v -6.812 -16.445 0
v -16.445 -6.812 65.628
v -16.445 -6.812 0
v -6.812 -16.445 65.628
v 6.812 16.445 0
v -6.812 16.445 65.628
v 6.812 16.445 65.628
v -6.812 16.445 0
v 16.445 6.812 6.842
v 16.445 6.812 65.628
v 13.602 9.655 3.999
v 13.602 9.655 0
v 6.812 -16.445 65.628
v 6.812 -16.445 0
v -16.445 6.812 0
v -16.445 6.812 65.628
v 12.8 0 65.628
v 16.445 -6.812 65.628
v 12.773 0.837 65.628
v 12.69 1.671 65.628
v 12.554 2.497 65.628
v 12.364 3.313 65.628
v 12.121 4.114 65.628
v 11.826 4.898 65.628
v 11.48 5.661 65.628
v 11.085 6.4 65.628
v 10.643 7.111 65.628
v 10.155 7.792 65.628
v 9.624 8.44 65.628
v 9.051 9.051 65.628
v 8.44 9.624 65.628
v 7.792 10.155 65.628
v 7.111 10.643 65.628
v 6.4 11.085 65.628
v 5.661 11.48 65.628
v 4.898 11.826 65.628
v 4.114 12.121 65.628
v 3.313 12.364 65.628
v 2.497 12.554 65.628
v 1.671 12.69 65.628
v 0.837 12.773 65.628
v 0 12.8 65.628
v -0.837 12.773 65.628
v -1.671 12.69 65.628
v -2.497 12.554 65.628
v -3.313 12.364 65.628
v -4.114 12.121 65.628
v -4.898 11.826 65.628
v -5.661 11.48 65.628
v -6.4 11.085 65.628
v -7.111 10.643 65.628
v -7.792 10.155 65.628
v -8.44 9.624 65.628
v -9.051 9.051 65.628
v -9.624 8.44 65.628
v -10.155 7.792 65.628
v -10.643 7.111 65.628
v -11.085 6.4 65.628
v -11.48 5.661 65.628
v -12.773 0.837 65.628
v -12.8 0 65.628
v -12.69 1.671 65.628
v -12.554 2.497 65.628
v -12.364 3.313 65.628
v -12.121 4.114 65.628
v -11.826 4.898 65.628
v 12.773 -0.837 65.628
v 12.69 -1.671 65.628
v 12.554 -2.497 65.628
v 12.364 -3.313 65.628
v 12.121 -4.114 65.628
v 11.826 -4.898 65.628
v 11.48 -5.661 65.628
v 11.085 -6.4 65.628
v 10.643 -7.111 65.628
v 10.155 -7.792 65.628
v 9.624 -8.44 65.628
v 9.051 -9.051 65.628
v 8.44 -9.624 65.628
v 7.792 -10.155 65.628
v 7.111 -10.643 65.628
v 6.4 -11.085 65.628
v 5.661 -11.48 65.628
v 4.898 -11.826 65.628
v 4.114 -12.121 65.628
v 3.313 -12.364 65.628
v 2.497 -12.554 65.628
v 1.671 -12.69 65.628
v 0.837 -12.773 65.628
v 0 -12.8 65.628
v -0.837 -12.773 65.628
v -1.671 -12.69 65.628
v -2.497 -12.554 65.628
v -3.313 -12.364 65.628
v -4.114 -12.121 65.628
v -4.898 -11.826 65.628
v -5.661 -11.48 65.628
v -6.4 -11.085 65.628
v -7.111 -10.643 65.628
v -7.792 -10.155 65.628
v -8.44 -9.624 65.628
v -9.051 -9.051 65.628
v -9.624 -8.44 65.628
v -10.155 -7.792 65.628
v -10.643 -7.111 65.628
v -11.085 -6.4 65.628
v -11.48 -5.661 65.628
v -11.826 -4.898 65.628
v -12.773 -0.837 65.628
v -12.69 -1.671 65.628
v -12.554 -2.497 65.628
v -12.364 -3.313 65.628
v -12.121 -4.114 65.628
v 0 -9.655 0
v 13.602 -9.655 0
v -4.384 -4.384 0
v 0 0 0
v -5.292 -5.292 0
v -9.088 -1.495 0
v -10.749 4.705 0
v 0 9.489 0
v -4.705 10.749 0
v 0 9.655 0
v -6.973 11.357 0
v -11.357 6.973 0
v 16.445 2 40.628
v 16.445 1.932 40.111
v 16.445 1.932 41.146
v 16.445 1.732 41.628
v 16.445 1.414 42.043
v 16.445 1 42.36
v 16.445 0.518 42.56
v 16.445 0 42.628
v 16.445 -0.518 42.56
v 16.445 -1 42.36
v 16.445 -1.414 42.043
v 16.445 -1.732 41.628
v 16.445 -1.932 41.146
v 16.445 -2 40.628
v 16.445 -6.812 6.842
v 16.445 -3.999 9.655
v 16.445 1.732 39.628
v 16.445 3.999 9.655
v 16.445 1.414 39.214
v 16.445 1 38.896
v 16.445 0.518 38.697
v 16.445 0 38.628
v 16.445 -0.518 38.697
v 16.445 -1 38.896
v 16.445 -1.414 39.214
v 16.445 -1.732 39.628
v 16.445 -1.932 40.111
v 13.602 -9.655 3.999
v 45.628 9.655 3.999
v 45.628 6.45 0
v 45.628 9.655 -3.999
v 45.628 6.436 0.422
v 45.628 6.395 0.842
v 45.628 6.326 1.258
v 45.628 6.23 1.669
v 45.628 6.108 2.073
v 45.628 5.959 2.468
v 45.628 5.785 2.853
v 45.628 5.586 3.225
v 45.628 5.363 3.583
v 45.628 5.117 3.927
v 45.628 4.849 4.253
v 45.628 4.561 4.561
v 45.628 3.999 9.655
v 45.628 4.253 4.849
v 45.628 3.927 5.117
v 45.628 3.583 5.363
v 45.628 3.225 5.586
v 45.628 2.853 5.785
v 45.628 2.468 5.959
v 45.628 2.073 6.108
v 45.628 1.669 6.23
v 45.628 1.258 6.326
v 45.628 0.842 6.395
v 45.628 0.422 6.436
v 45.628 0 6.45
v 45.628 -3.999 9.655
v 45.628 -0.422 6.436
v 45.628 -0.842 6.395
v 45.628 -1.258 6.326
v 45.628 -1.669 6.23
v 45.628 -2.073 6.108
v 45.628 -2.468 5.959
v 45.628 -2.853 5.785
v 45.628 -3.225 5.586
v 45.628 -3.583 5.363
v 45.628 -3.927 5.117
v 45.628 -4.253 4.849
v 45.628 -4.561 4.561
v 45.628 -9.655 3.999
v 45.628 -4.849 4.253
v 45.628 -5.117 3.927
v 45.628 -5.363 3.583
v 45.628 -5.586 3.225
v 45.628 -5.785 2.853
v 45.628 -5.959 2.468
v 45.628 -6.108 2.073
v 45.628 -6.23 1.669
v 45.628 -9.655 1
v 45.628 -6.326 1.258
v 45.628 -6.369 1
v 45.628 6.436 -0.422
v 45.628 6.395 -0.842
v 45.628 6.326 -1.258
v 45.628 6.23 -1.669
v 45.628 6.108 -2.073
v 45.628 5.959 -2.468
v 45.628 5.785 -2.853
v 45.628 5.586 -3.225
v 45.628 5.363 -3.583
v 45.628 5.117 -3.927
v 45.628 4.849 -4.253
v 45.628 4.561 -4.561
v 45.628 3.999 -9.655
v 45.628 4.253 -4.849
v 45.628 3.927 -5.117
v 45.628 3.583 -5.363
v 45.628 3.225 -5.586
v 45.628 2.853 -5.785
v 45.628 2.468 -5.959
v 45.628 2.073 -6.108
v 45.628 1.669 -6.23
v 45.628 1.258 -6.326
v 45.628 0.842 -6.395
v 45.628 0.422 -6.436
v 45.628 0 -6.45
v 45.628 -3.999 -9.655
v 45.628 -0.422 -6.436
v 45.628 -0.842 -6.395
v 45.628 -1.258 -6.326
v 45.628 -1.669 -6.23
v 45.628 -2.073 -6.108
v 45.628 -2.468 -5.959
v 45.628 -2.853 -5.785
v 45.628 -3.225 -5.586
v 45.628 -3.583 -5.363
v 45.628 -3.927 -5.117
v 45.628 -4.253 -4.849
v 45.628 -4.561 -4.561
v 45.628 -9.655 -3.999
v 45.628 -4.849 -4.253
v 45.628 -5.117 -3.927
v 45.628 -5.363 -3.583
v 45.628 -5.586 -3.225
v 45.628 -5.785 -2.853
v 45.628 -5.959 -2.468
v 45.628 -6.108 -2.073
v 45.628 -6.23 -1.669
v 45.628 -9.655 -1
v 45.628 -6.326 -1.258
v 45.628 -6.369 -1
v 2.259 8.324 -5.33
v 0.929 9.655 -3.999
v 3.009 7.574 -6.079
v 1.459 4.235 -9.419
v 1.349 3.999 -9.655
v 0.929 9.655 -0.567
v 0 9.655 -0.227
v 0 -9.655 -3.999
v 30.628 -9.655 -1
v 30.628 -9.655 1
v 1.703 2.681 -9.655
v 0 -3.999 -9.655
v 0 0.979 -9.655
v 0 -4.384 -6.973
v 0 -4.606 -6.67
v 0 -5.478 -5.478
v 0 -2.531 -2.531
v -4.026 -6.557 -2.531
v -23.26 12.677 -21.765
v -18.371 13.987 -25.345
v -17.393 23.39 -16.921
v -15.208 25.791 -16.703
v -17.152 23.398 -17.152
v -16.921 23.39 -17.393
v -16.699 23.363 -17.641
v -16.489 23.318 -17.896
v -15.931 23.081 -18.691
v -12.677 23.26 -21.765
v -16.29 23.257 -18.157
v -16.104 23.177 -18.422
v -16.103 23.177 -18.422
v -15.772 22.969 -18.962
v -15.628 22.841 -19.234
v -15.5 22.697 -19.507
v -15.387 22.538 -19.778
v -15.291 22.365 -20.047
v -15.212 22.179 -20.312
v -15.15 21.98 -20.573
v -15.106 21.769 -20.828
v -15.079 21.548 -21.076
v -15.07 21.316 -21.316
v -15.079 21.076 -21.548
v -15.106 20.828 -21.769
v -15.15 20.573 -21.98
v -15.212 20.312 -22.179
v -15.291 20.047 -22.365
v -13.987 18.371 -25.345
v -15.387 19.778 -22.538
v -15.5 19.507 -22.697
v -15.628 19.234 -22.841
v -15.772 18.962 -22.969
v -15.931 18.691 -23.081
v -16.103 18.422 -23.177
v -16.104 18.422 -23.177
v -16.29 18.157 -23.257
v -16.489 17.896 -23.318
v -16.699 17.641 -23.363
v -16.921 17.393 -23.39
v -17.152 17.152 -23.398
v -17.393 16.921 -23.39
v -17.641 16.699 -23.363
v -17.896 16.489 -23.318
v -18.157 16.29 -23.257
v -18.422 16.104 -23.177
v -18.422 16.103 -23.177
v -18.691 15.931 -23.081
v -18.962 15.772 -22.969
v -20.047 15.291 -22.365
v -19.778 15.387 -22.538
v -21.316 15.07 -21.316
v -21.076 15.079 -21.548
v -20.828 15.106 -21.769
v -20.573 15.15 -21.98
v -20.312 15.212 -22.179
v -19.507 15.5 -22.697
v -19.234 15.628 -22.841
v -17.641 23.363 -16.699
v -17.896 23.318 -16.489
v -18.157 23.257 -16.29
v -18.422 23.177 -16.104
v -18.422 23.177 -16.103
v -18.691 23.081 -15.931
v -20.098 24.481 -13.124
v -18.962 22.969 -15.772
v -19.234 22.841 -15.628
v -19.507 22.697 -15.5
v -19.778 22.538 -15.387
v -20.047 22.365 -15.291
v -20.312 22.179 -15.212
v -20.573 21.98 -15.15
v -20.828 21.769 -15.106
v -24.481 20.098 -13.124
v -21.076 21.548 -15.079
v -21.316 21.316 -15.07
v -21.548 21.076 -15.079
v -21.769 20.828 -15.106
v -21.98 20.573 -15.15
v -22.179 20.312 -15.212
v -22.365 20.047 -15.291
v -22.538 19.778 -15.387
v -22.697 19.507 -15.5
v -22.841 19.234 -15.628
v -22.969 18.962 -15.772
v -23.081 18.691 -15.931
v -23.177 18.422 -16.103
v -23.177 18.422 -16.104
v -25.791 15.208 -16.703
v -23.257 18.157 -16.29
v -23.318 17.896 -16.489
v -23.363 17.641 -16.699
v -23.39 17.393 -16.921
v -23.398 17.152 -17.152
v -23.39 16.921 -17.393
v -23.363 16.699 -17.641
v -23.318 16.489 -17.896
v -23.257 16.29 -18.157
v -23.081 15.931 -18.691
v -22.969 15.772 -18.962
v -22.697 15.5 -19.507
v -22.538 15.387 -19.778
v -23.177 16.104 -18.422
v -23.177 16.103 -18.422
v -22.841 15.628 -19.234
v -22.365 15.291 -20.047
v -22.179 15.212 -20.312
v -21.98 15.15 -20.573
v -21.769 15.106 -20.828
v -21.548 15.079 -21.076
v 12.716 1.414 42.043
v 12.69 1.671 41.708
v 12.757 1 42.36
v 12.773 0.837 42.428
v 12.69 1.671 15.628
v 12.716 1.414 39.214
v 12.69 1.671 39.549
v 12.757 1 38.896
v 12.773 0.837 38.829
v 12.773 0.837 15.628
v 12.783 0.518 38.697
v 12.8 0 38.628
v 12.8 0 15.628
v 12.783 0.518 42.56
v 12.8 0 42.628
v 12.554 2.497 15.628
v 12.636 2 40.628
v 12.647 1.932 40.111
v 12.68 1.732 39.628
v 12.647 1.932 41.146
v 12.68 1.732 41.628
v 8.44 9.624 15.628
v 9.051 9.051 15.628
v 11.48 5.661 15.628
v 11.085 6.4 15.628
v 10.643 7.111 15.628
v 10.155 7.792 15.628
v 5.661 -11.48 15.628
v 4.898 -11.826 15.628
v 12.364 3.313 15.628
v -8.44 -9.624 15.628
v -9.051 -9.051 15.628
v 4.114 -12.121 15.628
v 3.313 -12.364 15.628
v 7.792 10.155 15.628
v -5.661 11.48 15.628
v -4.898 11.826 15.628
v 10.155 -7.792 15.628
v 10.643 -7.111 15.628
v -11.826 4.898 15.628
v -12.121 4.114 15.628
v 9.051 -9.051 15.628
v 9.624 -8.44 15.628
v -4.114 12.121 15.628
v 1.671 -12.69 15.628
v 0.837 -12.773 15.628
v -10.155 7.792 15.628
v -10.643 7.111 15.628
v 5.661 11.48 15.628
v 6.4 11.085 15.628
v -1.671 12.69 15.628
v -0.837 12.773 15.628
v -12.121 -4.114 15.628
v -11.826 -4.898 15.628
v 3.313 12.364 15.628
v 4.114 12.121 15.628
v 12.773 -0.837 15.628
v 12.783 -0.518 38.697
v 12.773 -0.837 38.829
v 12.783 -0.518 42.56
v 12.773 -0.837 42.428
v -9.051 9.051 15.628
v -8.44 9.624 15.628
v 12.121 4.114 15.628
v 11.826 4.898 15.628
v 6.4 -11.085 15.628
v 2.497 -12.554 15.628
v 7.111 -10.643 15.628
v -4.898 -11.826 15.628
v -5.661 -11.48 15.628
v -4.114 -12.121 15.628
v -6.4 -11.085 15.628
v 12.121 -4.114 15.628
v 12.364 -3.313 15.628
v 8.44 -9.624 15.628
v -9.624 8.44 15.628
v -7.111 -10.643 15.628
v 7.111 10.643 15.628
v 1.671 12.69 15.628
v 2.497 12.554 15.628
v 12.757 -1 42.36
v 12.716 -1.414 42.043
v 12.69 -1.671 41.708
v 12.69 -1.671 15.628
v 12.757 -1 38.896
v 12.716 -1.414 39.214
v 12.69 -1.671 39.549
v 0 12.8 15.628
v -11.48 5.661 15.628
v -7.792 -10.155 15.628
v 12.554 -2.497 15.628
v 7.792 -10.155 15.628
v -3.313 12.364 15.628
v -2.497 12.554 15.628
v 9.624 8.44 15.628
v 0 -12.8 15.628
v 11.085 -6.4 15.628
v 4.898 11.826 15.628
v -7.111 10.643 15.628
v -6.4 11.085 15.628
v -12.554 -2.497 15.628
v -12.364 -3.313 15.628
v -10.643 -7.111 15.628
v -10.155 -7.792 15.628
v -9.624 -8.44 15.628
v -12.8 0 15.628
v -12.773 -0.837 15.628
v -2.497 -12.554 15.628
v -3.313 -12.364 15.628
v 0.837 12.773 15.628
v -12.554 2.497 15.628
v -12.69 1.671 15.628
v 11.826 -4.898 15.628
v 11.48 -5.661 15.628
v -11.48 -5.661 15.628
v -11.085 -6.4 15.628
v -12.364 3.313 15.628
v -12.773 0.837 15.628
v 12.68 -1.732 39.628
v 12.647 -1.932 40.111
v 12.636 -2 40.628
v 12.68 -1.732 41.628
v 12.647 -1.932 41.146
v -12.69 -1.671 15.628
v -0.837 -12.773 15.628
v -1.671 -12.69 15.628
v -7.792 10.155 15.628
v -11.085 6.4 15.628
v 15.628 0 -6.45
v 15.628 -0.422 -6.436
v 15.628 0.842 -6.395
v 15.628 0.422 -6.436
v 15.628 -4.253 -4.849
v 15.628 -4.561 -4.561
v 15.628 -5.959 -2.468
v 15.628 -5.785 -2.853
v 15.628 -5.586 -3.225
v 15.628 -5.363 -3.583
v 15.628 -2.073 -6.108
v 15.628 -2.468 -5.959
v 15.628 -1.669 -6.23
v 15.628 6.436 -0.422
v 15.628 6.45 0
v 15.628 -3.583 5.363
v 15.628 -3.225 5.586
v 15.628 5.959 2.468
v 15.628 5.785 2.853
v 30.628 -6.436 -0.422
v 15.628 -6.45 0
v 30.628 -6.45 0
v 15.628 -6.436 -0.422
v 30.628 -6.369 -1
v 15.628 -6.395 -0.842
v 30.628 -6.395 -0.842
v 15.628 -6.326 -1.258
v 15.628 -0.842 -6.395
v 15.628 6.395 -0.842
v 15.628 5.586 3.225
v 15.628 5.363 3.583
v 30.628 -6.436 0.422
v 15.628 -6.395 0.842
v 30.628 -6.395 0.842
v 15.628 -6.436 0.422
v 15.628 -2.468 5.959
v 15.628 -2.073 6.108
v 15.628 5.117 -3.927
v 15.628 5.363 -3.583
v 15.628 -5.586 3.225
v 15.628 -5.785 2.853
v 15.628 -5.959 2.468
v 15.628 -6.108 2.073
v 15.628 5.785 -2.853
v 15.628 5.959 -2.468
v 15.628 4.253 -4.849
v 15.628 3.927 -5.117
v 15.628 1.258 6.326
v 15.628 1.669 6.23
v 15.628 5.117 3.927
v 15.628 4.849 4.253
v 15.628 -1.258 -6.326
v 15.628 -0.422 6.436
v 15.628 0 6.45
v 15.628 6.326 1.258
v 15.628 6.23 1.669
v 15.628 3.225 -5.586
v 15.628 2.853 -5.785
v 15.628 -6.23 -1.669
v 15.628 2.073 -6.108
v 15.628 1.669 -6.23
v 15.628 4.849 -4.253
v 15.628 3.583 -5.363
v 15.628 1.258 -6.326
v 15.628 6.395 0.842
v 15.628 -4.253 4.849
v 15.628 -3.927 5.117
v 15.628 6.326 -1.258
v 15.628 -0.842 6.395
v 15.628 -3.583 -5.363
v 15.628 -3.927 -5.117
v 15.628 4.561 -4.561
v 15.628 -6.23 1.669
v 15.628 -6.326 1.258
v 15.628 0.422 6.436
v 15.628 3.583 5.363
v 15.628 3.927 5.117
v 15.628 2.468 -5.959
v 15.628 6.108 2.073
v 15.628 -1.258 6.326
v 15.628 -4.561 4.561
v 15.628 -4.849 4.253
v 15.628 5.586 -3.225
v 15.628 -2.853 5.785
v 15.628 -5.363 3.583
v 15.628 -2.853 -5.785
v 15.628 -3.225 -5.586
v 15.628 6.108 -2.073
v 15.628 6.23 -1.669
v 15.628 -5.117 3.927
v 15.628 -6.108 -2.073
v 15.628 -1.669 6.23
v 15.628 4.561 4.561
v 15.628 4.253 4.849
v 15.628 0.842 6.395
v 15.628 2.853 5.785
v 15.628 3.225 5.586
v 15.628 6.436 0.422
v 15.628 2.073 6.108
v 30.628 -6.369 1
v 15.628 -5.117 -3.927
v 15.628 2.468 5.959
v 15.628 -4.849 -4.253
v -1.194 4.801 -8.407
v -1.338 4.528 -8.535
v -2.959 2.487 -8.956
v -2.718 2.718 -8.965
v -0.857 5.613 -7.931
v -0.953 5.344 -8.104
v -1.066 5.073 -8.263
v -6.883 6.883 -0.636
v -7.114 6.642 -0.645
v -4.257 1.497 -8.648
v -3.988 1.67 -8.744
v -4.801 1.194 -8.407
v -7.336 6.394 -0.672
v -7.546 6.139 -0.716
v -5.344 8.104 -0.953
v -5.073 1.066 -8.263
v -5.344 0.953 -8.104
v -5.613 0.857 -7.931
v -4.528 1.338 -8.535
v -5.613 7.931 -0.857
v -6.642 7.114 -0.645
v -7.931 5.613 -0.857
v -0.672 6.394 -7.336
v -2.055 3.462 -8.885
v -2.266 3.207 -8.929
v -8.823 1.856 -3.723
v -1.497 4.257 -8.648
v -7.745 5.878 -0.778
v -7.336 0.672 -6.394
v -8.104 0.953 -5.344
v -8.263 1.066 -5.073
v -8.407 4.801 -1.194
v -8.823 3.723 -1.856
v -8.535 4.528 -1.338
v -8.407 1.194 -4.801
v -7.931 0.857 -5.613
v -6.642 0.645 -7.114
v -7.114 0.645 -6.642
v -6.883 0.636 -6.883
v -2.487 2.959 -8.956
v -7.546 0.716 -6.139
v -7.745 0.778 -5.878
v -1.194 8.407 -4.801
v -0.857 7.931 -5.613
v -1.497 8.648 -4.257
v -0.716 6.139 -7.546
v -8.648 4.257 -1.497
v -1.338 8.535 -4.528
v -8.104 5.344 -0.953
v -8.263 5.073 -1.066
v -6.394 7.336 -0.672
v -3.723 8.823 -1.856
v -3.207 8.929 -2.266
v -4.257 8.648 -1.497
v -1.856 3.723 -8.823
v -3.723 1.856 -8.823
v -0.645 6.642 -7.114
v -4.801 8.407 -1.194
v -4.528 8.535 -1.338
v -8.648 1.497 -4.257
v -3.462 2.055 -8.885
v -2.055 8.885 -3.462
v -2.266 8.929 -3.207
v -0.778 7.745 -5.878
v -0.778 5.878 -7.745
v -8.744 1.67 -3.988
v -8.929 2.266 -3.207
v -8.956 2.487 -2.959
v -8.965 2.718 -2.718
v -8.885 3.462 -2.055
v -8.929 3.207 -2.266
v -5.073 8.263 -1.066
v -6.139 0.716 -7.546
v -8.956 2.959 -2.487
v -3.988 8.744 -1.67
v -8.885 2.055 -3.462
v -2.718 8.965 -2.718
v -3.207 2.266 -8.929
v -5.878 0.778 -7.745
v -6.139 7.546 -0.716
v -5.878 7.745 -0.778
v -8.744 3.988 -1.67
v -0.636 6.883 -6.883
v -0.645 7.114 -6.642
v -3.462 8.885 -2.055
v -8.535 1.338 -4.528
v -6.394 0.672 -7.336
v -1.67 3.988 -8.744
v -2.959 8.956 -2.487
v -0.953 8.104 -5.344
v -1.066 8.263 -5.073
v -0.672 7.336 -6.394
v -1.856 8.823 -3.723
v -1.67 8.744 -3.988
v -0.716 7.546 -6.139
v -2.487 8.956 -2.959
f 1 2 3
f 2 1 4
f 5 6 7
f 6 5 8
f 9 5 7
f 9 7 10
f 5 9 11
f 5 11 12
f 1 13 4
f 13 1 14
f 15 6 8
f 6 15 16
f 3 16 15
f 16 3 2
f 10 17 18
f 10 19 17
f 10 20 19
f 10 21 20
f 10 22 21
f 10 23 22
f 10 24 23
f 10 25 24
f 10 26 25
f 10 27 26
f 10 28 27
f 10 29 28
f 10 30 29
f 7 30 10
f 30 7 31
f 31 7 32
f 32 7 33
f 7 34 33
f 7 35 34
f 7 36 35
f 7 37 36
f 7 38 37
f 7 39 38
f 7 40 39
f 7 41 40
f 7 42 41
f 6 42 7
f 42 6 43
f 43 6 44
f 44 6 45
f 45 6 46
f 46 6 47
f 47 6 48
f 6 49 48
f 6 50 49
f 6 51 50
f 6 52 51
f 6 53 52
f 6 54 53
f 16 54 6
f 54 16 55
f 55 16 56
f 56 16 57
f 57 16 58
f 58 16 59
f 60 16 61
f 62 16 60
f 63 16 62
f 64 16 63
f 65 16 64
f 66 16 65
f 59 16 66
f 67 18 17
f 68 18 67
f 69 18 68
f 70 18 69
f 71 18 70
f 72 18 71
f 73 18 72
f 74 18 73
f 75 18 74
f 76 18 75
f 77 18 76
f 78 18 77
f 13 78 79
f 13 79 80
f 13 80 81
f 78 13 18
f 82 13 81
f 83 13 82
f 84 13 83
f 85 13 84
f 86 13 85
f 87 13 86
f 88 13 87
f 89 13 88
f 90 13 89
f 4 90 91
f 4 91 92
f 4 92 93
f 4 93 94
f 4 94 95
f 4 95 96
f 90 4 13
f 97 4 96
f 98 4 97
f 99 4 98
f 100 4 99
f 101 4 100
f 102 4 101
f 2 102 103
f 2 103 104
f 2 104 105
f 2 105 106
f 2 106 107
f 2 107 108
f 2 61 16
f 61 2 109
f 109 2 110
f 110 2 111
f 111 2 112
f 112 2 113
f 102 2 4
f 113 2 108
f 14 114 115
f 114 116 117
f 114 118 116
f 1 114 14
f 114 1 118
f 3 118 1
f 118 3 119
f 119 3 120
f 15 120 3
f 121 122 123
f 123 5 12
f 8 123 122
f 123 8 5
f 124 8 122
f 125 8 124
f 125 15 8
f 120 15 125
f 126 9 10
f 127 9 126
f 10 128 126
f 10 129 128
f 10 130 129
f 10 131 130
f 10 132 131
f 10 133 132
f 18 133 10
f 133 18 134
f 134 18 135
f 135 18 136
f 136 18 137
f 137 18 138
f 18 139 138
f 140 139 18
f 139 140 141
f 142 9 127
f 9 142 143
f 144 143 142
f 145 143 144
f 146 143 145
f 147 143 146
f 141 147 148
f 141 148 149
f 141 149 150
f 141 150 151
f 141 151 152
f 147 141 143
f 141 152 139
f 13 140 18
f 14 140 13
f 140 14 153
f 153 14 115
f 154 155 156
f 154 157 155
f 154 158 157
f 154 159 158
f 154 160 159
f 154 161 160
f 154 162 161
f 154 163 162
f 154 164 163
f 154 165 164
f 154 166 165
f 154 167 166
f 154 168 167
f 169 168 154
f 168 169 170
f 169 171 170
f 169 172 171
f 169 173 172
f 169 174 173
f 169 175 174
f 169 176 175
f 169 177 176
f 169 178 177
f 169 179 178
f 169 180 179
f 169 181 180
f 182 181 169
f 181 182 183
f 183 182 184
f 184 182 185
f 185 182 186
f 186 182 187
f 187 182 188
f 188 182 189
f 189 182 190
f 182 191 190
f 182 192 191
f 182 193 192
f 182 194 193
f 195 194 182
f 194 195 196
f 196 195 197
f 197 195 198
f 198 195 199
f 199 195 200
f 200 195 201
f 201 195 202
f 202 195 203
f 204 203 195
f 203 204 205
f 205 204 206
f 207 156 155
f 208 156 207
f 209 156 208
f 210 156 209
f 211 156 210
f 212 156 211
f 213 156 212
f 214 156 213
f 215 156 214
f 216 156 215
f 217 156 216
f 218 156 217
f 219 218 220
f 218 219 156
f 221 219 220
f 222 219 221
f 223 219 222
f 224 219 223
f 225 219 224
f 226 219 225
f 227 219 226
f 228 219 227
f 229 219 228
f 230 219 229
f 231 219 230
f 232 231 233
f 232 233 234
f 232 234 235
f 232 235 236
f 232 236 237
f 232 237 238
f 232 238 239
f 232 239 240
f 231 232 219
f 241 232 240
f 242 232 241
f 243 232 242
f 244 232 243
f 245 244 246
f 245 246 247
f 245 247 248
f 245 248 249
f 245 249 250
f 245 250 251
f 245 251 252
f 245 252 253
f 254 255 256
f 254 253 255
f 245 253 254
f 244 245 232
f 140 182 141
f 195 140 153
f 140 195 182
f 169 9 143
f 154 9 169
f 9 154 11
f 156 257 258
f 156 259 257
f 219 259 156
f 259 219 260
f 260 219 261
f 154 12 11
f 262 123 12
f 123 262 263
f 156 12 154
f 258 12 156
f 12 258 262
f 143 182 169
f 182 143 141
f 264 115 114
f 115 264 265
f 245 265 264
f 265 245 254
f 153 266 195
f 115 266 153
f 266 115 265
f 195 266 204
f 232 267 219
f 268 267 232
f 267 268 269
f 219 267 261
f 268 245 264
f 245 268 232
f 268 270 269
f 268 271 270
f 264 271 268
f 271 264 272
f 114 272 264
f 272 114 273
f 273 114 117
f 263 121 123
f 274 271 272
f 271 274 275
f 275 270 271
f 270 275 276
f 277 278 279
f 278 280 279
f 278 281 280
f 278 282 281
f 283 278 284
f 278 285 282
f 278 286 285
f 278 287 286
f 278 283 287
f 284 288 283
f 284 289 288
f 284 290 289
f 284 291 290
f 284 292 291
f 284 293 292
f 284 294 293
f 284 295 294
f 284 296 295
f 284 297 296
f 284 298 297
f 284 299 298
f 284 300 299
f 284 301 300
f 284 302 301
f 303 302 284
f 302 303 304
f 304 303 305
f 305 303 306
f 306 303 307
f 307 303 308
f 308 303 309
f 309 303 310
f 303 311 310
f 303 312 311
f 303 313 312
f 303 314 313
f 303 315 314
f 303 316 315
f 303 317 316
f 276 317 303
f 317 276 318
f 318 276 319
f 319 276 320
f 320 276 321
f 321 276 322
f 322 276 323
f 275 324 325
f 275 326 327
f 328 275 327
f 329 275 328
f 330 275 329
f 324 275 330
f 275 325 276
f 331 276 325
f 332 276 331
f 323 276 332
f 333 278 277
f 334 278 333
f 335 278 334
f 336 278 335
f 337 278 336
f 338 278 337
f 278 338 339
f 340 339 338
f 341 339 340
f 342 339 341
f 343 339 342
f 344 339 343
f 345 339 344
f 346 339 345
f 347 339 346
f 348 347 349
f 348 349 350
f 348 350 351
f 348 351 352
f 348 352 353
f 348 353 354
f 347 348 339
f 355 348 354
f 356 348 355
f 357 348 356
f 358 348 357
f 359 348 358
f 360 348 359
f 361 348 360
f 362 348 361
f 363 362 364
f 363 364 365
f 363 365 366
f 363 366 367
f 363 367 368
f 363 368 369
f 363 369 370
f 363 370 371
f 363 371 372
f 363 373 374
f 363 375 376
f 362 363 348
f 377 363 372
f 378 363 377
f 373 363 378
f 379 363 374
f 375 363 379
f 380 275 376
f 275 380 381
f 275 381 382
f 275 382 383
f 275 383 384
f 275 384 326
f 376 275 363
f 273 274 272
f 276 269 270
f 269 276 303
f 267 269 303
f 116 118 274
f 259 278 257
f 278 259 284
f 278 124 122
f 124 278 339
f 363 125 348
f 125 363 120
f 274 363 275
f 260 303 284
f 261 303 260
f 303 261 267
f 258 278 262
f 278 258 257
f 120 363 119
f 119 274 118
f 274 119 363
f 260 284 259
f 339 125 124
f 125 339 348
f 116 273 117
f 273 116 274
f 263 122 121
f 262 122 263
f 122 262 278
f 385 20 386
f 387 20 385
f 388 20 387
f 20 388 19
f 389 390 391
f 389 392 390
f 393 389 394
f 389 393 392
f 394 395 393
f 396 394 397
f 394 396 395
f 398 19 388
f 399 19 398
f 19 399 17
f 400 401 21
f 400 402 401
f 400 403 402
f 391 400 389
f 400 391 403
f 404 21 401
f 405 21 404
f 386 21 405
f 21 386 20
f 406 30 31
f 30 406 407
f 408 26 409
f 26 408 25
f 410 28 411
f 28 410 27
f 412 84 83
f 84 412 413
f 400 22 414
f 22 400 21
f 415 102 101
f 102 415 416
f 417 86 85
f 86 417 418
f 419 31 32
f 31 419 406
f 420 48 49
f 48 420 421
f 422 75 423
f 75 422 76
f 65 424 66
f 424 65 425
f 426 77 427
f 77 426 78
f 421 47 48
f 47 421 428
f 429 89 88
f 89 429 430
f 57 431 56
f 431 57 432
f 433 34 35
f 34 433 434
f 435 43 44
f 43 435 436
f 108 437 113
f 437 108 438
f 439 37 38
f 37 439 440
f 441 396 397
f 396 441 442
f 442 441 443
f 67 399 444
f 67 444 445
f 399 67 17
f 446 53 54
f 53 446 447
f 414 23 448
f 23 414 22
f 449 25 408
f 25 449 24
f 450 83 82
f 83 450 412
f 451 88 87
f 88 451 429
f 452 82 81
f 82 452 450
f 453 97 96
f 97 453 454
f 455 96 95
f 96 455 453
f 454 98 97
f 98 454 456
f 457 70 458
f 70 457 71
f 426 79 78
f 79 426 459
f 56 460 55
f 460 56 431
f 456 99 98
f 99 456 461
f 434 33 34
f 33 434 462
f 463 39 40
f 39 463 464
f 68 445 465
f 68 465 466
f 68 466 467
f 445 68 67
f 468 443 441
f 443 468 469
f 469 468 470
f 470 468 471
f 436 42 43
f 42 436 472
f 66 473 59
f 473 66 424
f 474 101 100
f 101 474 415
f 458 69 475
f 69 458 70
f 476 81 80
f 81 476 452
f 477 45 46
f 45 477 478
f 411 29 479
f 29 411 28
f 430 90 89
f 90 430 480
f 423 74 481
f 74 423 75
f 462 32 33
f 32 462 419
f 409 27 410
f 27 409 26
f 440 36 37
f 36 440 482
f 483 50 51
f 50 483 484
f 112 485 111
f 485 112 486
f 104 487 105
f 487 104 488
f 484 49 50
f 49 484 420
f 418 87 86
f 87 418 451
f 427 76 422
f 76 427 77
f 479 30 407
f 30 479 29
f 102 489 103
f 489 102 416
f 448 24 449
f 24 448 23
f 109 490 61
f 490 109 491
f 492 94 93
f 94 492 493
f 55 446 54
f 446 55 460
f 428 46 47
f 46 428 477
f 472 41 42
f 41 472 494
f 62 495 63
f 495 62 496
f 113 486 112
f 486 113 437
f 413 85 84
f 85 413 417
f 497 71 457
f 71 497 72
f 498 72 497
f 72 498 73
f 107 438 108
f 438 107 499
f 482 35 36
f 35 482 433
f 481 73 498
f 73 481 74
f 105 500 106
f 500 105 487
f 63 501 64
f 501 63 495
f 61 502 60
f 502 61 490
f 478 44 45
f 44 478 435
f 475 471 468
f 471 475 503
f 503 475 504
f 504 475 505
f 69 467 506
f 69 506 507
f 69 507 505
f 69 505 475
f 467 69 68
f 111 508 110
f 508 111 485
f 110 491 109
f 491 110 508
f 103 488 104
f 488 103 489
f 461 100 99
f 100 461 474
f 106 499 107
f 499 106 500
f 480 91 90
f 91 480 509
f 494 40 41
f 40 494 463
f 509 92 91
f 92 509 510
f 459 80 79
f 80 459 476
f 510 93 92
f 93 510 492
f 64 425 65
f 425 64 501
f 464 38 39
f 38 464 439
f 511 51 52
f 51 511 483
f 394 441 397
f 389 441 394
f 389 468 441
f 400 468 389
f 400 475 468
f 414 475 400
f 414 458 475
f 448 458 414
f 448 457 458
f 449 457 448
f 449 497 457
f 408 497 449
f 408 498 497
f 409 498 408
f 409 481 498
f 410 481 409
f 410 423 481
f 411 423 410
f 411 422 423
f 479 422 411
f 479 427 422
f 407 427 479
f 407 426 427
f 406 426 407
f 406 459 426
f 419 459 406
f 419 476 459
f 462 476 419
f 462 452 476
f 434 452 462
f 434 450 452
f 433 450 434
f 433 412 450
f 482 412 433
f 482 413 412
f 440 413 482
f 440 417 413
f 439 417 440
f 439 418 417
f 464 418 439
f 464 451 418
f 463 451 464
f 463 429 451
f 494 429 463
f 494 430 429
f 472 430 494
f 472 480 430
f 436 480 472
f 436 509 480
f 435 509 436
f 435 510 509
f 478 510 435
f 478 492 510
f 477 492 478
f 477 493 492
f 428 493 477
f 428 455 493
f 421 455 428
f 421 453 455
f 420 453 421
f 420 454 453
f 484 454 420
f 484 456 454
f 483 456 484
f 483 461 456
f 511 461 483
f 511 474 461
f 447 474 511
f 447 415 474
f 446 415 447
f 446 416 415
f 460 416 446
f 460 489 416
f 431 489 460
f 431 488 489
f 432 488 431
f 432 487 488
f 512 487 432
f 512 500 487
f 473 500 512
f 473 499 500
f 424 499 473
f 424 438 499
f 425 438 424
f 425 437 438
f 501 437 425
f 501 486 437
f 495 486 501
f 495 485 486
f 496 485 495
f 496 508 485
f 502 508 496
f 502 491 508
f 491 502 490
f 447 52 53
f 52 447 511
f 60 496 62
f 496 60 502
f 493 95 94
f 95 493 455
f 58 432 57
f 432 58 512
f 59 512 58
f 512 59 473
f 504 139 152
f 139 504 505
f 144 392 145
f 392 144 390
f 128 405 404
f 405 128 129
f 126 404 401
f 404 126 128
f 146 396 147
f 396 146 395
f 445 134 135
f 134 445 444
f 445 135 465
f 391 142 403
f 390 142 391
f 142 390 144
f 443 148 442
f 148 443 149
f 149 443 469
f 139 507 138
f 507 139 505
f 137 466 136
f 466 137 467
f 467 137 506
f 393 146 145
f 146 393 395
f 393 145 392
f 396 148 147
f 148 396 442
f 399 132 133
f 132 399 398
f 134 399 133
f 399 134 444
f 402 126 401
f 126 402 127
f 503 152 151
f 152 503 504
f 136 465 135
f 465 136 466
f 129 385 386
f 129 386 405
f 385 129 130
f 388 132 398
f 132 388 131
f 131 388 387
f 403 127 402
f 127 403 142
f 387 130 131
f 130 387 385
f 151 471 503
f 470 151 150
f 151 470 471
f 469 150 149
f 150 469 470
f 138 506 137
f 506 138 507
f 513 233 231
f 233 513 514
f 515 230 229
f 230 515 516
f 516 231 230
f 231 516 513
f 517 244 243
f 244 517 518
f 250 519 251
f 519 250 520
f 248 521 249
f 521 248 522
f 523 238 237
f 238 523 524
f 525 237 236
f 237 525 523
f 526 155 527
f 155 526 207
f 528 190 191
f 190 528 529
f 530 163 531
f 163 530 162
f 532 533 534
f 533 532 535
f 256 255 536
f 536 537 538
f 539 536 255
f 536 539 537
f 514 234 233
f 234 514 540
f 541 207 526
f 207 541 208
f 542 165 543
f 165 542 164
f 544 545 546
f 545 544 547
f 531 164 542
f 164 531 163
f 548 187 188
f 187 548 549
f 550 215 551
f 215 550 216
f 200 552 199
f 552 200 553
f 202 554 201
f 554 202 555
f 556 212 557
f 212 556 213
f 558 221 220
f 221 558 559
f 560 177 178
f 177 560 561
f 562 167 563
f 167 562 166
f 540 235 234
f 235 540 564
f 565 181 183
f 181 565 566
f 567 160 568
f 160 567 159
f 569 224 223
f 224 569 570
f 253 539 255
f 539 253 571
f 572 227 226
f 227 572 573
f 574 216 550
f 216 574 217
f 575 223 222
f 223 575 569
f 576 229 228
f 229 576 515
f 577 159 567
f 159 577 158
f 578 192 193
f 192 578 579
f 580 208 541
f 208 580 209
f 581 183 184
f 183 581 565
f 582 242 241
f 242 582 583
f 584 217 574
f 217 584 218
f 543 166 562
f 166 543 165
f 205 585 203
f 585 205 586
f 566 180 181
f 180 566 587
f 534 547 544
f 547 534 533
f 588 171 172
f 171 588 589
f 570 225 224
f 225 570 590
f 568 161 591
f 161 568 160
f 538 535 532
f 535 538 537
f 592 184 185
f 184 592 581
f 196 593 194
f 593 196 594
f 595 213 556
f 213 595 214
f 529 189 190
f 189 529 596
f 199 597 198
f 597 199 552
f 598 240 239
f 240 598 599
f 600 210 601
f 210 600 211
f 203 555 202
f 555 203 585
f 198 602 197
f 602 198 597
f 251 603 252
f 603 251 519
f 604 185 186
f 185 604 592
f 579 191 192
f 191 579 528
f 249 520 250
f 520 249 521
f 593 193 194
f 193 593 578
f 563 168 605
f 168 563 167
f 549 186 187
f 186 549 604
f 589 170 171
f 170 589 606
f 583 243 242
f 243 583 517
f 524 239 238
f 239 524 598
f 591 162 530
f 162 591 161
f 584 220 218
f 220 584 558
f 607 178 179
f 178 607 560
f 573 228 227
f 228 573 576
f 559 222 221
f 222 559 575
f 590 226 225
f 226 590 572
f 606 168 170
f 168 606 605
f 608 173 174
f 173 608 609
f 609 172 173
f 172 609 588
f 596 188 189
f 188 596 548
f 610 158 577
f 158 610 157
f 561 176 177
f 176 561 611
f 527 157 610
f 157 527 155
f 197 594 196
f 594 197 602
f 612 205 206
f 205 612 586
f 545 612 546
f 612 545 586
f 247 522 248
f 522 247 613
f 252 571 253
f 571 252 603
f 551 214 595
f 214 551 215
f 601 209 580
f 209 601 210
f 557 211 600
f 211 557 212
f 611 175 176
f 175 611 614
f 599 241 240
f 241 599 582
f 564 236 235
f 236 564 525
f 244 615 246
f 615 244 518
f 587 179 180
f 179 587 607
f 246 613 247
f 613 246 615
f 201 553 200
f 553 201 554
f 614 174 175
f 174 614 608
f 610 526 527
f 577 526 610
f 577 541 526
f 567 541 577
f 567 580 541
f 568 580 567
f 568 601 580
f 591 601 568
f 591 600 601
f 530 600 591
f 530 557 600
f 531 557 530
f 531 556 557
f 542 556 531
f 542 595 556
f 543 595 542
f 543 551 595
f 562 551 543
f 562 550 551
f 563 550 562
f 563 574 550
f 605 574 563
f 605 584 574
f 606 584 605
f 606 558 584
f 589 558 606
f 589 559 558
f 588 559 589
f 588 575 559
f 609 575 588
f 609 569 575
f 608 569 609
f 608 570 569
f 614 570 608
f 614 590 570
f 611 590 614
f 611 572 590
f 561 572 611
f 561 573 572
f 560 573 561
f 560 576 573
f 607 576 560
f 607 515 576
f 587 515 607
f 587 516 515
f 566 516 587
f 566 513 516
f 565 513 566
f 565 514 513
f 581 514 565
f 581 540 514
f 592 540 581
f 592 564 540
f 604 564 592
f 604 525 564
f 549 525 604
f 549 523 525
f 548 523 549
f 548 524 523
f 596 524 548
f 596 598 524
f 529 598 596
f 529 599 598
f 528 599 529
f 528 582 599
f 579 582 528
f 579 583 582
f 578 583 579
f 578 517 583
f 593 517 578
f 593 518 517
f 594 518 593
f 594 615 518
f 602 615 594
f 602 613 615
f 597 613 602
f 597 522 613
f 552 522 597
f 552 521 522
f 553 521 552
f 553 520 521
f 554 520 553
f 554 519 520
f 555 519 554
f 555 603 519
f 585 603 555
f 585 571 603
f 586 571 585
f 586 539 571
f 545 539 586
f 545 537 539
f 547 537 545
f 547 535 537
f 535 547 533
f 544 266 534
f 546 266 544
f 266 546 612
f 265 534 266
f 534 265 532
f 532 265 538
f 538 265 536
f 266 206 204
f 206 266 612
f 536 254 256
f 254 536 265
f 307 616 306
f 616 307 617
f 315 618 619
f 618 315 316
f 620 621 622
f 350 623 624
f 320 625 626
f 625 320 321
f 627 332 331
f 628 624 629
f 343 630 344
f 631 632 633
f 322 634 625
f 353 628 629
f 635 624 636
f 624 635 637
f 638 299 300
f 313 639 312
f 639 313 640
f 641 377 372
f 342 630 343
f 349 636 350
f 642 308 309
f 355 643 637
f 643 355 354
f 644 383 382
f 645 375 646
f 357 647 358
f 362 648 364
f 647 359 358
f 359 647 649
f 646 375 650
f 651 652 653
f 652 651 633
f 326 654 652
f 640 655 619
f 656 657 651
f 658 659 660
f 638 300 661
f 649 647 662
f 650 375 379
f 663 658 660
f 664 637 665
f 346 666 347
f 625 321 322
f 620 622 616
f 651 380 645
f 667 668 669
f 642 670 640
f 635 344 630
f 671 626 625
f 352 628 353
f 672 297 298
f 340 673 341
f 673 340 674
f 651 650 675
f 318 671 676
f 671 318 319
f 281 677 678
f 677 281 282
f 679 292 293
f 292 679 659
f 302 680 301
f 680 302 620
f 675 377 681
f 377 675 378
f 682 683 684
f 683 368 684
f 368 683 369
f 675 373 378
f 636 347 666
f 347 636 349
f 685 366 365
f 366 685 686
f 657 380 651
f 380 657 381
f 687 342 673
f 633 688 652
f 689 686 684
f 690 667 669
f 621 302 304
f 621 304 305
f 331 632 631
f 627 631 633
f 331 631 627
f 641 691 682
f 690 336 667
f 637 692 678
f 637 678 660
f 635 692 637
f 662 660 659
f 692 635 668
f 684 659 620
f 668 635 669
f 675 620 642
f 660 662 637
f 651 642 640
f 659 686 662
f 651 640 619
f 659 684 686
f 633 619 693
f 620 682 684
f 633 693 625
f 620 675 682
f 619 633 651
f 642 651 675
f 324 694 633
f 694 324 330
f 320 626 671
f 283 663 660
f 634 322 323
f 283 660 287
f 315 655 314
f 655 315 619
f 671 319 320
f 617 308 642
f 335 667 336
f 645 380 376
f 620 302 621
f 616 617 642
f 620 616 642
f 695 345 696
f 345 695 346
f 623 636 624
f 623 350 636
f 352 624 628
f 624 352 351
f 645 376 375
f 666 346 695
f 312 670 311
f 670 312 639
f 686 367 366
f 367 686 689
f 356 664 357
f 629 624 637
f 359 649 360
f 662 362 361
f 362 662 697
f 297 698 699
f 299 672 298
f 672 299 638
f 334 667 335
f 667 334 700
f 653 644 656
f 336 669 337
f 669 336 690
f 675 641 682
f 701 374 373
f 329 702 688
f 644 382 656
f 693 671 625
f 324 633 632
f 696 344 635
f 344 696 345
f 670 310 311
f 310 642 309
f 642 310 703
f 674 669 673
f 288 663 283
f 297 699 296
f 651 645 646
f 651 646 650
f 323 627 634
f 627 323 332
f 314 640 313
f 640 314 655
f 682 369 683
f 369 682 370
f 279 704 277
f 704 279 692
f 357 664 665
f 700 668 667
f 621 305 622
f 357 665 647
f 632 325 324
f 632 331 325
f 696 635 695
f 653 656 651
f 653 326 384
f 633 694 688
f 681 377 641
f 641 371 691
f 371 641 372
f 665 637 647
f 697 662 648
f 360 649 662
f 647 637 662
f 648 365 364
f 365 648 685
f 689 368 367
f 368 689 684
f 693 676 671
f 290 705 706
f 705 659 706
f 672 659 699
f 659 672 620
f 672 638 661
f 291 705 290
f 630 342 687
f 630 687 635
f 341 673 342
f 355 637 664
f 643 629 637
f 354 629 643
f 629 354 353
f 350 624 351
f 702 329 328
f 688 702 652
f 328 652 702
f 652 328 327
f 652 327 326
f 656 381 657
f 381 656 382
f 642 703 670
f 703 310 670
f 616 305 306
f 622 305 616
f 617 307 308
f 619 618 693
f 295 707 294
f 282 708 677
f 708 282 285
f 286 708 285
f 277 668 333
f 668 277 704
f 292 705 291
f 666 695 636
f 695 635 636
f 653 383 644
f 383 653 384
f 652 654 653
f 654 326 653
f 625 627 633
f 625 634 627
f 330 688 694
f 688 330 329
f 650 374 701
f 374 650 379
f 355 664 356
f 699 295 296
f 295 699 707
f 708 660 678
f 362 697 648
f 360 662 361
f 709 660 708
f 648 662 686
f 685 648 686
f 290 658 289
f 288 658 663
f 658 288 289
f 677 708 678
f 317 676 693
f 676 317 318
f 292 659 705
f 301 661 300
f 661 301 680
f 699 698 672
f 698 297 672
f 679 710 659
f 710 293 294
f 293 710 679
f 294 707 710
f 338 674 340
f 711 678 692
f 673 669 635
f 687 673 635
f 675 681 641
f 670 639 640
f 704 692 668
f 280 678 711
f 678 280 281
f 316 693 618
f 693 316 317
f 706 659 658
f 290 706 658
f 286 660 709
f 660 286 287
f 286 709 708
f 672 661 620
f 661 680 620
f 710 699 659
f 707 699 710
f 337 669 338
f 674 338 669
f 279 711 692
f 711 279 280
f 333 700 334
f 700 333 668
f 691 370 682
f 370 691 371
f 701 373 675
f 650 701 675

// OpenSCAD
// One hub, three rod sizes: a 1-inch post held by a set screw, a 1/2-inch
// arm that clamps with a slot, and a 10 mm stay at an angle.
use <../rod_connectors.scad>

$fn = $preview ? 32 : 96;

rod_connector(
    [
        rod([0, 0, 1], diameter=25.4, screw=4),
        rod([1, 0, 0], diameter=12.7, depth=30, wall=4, slot=2, feature_angle=90),
        rod([-1, 1, -1], diameter=10, depth=25, wall=3),
    ]
);
